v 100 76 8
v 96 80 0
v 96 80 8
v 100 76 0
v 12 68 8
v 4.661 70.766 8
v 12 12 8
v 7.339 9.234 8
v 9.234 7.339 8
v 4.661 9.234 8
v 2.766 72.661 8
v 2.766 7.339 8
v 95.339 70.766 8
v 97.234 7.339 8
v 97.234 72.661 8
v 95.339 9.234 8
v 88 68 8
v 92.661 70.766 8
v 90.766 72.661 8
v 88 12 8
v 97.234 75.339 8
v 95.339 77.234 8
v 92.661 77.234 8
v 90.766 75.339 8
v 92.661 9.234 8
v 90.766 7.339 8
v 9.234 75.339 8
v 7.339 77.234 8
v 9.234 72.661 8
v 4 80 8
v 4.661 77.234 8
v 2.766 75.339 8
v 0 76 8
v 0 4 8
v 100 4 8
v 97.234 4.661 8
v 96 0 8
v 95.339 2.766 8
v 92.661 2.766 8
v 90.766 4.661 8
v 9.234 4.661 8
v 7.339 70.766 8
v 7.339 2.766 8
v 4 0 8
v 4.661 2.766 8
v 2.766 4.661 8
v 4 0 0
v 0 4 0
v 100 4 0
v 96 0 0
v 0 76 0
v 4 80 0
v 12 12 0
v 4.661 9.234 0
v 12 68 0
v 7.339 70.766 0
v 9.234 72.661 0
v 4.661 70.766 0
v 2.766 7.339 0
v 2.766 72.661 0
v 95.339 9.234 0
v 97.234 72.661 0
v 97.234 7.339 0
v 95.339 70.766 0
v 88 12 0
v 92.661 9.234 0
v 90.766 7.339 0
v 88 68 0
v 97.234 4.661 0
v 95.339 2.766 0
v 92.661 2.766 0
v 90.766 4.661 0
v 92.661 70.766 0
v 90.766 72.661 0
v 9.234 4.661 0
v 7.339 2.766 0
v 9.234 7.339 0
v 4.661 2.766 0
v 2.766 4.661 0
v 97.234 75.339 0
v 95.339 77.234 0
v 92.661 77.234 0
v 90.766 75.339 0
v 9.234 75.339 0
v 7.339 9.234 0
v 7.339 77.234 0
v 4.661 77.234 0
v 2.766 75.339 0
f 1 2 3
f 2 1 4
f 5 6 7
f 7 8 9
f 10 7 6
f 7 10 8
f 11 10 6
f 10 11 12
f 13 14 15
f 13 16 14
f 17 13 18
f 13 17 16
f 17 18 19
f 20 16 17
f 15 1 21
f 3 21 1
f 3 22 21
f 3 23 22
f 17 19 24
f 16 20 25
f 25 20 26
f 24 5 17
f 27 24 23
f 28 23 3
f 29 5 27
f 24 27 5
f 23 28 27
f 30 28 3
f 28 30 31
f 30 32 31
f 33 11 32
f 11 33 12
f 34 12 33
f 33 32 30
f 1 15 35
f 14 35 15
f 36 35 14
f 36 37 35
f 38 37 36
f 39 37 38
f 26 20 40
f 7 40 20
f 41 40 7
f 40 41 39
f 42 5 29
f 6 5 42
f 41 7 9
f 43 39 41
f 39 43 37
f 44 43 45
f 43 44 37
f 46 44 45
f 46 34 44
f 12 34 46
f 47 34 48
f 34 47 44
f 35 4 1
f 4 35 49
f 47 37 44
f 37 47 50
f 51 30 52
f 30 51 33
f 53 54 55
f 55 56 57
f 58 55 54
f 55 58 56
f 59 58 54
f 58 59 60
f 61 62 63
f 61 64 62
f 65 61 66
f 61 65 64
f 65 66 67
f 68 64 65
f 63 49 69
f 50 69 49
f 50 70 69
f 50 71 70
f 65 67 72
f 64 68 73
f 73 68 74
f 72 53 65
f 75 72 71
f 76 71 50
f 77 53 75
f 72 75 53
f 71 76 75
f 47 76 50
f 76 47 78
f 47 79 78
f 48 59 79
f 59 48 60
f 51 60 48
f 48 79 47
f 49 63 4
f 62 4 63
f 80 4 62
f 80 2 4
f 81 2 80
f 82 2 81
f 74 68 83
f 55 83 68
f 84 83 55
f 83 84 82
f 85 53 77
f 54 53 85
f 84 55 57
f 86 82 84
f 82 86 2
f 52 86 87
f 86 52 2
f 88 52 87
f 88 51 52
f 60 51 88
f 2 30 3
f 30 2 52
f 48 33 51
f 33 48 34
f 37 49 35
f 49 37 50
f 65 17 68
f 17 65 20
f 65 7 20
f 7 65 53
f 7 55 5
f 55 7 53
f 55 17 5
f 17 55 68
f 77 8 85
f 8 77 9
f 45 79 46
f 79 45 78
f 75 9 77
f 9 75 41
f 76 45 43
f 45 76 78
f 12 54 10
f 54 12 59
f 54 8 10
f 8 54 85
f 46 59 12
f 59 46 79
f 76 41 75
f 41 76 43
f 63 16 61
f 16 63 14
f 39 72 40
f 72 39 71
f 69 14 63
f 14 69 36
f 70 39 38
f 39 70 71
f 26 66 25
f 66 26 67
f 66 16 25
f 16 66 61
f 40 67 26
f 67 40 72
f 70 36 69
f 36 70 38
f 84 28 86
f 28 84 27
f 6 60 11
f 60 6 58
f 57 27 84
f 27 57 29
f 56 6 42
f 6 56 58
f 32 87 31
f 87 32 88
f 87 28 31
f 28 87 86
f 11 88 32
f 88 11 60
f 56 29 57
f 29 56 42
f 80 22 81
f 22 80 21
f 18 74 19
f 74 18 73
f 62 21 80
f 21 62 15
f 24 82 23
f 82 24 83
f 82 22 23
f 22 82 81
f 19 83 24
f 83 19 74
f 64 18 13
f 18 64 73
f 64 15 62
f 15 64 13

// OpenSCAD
$fn = 32;

// ----------------------------------------------------------------------
// Frame plate: 100 x 80 frame, 12 mm rails
// ----------------------------------------------------------------------

// --- parameters (mm) ---
plate_l = 100;            // plate length, X
plate_w = 80;             // plate width, Y
plate_t = 8;              // plate thickness, Z (extrusion height)
corner_c = 4;             // corner chamfer
frame_bar = 12;           // frame rail width
bolt_r = 3.5;             // corner bolt window radius
bolt_inset = 6;           // bolt centre inset from the edges

win_l = plate_l - 2 * frame_bar;  // window length
win_w = plate_w - 2 * frame_bar;  // window width
bolt_d = 2 * bolt_r;  // corner hole diameter

profile = [[4, 0], [96, 0], [100, 4], [100, 76], [96, 80], [4, 80], [0, 76], [0, 4]];  // primary outline, 8 points, counter clockwise
void_1 = [[12, 12], [88, 12], [88, 68], [12, 68]];  // the window, 4 points
void_2 = [[9.234, 7.339], [7.339, 9.234], [4.661, 9.234], [2.766, 7.339], [2.766, 4.661], [4.661, 2.766], [7.339, 2.766], [9.234, 4.661]];  // corner bolt window, 8 points
void_3 = [[97.234, 7.339], [95.339, 9.234], [92.661, 9.234], [90.766, 7.339], [90.766, 4.661], [92.661, 2.766], [95.339, 2.766], [97.234, 4.661]];  // corner bolt window, 8 points
void_4 = [[9.234, 75.339], [7.339, 77.234], [4.661, 77.234], [2.766, 75.339], [2.766, 72.661], [4.661, 70.766], [7.339, 70.766], [9.234, 72.661]];  // corner bolt window, 8 points
void_5 = [[97.234, 75.339], [95.339, 77.234], [92.661, 77.234], [90.766, 75.339], [90.766, 72.661], [92.661, 70.766], [95.339, 70.766], [97.234, 72.661]];  // corner bolt window, 8 points

// --- the one profile operation ---
difference() {
  linear_extrude(height = plate_t) polygon(points = profile);
  translate([0, 0, -1])
    linear_extrude(height = plate_t + 2) polygon(points = void_1);
  translate([0, 0, -1])
    linear_extrude(height = plate_t + 2) polygon(points = void_2);
  translate([0, 0, -1])
    linear_extrude(height = plate_t + 2) polygon(points = void_3);
  translate([0, 0, -1])
    linear_extrude(height = plate_t + 2) polygon(points = void_4);
  translate([0, 0, -1])
    linear_extrude(height = plate_t + 2) polygon(points = void_5);
}
